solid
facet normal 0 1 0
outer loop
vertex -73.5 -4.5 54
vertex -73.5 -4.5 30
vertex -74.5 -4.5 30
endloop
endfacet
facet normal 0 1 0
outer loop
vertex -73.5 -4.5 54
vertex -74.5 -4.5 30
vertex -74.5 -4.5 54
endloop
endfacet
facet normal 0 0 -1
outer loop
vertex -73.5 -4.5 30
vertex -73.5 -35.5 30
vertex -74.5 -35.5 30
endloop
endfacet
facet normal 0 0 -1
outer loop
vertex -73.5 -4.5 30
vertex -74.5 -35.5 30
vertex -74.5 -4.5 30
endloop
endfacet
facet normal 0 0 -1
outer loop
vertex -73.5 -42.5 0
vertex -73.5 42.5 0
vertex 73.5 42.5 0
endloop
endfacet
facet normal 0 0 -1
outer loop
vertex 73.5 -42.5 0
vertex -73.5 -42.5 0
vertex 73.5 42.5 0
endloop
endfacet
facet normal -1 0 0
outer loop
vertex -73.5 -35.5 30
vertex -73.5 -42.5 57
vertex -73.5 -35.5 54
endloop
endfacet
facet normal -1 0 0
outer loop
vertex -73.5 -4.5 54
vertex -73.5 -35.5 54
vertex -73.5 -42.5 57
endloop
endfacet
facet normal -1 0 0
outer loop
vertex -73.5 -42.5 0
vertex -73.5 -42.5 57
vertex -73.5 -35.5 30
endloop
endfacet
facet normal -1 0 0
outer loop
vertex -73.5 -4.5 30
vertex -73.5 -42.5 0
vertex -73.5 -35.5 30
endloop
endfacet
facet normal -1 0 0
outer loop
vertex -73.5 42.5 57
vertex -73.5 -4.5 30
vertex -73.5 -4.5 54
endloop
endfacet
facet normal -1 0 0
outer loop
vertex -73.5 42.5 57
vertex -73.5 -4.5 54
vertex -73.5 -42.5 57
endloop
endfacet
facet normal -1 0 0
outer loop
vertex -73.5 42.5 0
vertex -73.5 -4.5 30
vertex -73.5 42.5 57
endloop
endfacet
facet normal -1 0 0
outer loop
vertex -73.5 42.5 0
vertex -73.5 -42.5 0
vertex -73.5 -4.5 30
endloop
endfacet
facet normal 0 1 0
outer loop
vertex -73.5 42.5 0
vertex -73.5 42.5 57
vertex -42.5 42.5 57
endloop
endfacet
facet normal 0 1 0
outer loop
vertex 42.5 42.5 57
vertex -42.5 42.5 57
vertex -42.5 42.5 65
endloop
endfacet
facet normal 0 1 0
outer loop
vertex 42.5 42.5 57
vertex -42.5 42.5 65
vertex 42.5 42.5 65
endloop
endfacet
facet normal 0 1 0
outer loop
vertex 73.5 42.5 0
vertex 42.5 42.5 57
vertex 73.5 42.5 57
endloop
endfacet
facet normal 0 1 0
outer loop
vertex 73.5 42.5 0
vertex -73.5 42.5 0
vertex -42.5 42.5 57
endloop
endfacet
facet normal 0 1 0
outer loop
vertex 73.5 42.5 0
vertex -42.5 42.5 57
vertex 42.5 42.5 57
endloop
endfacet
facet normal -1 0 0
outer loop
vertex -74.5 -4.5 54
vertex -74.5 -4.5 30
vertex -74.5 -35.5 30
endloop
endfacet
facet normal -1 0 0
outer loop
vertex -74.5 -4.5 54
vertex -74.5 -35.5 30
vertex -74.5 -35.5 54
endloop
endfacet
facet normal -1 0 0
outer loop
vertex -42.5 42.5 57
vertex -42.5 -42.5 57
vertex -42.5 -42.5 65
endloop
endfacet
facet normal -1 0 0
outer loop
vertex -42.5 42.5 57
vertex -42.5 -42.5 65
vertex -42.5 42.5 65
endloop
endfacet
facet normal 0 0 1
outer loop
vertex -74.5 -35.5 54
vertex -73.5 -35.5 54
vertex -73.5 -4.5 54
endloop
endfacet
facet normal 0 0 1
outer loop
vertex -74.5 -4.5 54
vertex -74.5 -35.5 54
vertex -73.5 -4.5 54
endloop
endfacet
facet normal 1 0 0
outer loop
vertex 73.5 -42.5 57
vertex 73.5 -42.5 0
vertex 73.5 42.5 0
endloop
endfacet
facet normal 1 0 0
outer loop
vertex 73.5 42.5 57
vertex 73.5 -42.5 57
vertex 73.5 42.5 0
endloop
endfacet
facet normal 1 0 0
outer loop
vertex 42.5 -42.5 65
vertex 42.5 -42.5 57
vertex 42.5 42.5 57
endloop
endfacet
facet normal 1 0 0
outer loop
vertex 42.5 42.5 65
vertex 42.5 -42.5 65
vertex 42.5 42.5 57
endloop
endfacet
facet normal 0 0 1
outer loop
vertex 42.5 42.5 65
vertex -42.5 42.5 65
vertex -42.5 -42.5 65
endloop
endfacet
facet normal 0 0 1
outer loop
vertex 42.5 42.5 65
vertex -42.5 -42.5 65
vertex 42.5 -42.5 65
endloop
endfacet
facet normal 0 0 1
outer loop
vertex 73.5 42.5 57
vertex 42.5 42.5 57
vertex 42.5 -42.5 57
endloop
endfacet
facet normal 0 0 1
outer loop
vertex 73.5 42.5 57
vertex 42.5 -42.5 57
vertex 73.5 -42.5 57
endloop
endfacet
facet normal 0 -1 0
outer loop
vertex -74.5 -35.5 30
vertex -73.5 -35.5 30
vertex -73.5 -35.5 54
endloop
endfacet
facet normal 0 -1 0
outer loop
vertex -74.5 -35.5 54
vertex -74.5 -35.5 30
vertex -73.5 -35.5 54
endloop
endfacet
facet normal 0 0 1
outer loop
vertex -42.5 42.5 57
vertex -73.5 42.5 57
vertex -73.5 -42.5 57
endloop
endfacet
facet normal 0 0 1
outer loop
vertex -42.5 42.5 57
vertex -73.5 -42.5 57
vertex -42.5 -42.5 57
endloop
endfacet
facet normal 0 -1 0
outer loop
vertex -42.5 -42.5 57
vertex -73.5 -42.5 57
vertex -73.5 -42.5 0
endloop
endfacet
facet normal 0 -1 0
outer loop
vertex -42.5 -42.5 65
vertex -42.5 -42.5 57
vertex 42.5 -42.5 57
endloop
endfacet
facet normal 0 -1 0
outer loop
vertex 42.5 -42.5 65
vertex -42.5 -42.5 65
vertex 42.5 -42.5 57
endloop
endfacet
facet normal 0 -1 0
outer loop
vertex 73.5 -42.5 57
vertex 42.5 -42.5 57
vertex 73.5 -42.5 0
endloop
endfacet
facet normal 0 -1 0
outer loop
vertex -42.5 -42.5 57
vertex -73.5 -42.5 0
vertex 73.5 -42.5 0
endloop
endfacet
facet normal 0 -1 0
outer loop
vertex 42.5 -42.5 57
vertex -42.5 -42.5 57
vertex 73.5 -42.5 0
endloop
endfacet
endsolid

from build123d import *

# Parameters (mm, degrees)
SKETCH1_W           = 147
SKETCH1_H           = 85
BOSS_EXTRUDE1_DEPTH = 57
SKETCH2_W           = 85
SKETCH2_H           = 85
BOSS_EXTRUDE2_DEPTH = 8
SKETCH3_W           = 24
SKETCH3_H           = 31
BOSS_EXTRUDE3_DEPTH = 1


with BuildPart() as part:
    # Sketch1 → Boss-Extrude1 (new body)
    with BuildSketch(Plane.XY):
        Rectangle(SKETCH1_W, SKETCH1_H)
    extrude(amount=BOSS_EXTRUDE1_DEPTH)

    # Sketch2 → Boss-Extrude2 (add)
    with BuildSketch(Plane.XY.offset(57)):
        Rectangle(SKETCH2_W, SKETCH2_H)
    extrude(amount=BOSS_EXTRUDE2_DEPTH)

    # Sketch3 → Boss-Extrude3 (add)
    with BuildSketch(Plane.ZY.offset(73.5)):
        with Locations((42, -20)):
            Rectangle(SKETCH3_W, SKETCH3_H)
    extrude(amount=BOSS_EXTRUDE3_DEPTH)


solid = part.part
